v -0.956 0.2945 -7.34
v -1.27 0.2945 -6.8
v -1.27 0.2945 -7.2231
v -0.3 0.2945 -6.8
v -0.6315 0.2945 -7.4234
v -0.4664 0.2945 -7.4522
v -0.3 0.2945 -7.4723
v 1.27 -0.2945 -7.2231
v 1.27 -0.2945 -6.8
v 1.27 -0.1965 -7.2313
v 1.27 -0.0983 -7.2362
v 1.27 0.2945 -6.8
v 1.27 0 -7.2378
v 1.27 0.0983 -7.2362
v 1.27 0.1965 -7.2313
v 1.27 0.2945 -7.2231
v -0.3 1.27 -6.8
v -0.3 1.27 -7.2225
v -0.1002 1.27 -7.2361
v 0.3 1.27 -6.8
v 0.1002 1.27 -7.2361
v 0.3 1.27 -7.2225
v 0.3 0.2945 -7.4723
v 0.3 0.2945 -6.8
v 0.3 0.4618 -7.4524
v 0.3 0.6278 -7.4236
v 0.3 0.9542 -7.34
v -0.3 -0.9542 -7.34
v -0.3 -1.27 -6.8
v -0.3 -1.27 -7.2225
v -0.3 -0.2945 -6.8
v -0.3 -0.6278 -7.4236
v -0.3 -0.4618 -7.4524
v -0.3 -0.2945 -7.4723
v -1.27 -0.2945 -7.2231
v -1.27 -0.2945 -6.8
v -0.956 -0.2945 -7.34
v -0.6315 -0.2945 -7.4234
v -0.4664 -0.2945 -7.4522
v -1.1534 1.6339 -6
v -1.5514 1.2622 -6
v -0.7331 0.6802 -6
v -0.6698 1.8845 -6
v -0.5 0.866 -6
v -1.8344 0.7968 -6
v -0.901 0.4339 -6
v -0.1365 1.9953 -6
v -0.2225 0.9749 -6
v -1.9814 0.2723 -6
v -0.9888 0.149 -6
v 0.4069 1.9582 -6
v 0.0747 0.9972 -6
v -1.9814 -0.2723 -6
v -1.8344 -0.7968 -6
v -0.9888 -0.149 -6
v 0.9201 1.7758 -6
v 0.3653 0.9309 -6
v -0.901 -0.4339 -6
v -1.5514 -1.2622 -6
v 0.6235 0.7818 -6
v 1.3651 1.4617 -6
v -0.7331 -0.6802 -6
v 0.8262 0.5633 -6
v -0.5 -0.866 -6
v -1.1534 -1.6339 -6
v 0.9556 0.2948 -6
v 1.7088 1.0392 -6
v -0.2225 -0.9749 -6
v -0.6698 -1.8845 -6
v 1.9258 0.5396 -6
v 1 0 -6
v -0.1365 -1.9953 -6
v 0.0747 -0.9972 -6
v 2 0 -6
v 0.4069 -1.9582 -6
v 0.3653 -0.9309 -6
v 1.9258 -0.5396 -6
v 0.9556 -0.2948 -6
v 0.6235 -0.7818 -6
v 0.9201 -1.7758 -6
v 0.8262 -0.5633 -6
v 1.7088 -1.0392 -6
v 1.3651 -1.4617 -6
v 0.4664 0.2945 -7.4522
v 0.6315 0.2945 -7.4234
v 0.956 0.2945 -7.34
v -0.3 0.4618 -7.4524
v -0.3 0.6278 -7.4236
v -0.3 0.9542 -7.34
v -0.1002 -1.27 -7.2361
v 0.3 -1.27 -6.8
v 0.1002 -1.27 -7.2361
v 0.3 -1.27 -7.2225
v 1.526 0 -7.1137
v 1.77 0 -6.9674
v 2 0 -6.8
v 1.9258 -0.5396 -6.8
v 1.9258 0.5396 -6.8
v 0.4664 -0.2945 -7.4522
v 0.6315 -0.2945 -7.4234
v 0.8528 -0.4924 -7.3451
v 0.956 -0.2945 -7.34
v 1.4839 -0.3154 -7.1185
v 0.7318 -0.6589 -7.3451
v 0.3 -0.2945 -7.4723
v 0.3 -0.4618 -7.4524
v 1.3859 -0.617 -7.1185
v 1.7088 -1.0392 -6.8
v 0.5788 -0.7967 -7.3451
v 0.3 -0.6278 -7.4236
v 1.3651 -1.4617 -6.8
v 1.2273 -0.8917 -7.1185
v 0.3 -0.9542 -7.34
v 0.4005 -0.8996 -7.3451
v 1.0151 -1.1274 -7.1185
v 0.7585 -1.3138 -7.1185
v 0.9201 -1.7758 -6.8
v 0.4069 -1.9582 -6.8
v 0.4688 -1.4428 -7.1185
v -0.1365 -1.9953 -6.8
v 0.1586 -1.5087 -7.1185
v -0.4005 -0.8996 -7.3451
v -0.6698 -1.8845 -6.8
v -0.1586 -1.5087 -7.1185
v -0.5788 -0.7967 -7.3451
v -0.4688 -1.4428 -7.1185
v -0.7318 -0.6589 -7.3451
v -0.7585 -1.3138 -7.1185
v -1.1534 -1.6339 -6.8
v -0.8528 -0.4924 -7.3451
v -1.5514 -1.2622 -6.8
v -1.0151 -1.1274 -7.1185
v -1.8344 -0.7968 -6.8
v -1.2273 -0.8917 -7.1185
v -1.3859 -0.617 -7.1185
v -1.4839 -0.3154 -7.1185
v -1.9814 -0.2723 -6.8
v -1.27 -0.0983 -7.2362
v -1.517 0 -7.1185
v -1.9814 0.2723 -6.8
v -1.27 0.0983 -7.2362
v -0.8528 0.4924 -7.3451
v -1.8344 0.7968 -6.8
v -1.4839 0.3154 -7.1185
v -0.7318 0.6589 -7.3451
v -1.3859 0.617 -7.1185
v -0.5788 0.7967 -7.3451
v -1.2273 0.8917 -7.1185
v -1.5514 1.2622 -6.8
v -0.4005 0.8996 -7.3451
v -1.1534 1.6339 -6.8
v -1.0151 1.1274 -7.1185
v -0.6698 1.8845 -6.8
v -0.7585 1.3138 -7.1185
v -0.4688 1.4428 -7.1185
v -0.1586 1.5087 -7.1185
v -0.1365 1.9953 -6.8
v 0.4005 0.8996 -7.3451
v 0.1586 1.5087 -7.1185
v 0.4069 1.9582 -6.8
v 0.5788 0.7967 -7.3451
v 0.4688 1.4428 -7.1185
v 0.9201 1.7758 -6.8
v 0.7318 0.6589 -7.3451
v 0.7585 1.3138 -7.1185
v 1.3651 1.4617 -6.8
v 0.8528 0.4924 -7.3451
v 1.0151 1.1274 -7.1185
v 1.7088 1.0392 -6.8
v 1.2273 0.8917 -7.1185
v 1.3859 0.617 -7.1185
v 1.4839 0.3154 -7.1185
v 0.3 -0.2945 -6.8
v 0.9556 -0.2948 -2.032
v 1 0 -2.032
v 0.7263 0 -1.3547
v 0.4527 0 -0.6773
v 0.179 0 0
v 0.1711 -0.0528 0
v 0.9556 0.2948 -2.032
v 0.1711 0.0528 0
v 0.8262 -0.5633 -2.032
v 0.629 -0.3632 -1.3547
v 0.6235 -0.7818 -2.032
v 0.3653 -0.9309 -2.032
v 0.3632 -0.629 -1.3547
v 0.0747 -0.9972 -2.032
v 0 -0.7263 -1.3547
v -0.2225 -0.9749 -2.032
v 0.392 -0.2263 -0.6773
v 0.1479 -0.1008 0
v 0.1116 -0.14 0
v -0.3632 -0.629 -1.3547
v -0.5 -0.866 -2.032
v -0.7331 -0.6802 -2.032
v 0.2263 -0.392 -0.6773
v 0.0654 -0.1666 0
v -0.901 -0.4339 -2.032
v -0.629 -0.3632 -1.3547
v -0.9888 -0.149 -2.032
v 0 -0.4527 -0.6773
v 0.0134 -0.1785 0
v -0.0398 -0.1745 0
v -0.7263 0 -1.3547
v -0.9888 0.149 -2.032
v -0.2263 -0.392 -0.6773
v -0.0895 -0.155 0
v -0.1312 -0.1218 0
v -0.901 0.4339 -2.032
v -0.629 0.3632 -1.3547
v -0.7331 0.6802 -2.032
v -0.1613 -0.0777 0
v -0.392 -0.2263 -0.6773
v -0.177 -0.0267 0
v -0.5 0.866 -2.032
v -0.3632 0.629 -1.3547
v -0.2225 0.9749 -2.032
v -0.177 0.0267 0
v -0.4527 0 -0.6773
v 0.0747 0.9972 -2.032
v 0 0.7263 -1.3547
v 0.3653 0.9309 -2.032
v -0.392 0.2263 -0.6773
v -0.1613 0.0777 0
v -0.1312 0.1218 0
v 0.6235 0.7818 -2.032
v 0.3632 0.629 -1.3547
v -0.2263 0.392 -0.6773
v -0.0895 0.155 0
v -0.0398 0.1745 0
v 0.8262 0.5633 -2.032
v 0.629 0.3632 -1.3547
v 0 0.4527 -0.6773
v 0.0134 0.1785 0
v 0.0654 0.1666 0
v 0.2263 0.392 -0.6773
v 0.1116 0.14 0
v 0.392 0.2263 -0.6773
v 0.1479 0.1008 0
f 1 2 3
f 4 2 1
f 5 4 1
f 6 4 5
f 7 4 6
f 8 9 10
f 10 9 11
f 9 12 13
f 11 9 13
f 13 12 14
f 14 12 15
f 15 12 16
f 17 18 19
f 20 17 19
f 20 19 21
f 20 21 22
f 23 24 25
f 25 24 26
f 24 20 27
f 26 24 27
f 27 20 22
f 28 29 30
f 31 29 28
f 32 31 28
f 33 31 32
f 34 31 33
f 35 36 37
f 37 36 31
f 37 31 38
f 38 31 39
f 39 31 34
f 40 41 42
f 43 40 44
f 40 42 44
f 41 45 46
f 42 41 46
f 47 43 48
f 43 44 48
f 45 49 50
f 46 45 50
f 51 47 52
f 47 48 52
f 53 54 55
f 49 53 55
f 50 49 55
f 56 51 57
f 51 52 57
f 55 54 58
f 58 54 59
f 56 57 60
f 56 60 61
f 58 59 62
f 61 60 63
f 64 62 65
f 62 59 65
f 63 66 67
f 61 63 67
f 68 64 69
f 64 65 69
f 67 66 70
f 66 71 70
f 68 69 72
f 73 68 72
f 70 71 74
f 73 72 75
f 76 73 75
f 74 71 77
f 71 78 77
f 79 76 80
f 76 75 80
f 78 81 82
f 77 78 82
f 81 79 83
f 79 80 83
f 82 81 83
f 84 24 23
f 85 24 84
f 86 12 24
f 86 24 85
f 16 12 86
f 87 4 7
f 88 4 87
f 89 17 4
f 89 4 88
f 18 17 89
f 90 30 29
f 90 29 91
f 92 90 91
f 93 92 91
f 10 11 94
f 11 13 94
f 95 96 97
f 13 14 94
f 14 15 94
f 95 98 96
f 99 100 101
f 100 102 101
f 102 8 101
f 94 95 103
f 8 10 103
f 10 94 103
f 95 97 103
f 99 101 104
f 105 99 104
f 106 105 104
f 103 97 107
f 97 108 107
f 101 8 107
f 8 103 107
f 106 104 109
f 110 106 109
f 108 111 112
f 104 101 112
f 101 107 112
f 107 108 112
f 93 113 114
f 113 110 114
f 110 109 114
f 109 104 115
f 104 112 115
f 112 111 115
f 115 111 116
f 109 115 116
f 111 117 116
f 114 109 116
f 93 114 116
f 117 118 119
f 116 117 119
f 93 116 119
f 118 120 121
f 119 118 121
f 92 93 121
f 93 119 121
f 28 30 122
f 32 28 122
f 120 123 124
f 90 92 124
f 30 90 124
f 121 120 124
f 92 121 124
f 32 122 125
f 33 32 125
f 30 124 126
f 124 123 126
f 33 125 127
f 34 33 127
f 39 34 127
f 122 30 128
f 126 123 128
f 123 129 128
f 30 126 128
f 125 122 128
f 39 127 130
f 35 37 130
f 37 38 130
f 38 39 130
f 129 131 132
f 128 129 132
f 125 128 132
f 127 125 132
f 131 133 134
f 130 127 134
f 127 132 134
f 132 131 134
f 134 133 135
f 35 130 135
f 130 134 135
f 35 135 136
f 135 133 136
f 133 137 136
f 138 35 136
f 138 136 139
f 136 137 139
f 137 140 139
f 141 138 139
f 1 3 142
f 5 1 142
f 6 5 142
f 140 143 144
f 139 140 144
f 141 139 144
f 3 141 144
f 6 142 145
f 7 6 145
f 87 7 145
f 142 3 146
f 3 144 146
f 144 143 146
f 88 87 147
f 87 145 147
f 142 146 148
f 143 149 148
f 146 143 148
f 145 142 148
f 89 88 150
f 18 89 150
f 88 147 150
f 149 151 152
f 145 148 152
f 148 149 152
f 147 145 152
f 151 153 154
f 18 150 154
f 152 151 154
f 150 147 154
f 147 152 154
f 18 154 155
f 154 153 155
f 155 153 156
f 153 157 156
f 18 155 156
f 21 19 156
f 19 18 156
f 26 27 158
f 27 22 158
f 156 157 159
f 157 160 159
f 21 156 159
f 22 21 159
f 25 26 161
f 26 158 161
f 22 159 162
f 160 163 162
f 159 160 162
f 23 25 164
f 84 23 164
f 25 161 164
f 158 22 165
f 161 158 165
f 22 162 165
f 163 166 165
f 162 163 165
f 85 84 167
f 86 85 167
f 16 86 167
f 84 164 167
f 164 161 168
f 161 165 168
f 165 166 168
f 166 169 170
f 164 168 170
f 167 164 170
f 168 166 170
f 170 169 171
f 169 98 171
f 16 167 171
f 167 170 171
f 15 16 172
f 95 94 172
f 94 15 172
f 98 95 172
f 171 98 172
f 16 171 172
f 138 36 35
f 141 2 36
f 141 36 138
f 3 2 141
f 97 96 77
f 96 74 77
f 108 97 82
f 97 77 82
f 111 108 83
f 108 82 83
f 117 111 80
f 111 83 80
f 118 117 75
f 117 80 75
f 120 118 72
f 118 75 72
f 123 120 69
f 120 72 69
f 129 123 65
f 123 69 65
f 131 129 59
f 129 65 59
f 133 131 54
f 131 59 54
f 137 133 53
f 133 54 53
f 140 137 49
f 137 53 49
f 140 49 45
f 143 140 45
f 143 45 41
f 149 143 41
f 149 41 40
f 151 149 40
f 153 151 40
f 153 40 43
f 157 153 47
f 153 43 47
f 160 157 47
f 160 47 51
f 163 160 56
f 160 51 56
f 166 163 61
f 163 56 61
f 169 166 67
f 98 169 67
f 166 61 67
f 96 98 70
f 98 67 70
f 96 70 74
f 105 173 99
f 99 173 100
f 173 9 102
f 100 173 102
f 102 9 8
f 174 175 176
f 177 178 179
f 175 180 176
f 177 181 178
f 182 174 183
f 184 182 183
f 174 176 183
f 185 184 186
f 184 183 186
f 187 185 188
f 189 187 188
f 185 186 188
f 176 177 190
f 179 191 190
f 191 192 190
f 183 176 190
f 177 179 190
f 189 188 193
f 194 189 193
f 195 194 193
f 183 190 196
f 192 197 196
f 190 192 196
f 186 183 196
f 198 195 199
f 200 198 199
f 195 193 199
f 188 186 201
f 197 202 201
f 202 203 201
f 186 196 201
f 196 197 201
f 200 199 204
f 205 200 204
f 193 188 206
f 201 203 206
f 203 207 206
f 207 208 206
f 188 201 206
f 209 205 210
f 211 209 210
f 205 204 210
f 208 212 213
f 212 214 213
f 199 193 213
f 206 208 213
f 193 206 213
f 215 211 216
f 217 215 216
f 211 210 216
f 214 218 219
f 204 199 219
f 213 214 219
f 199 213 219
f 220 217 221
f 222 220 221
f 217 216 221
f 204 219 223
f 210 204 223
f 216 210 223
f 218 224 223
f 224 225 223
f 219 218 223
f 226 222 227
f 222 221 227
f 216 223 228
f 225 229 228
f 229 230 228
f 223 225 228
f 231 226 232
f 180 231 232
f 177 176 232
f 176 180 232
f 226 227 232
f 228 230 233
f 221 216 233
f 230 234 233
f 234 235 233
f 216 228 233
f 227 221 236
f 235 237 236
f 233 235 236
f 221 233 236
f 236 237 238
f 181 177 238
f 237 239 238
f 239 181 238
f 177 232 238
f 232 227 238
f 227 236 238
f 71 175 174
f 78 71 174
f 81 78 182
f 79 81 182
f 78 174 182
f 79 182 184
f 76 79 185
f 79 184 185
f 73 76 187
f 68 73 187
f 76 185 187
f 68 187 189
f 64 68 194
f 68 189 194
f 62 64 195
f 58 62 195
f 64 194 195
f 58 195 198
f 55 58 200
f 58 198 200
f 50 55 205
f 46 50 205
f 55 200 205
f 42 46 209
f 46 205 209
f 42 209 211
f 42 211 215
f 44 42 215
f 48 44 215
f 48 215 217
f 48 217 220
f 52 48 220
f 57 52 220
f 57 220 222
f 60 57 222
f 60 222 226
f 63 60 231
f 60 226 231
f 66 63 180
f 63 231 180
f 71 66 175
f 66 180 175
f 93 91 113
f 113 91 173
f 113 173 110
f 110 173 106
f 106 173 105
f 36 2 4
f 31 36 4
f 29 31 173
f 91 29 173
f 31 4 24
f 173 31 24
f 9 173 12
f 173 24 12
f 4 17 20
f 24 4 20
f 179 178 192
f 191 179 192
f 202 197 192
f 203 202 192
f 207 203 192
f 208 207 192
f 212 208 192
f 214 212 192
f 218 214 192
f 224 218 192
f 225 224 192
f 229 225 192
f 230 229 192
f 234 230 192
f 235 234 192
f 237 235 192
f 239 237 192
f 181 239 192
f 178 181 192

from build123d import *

# Parameters (mm, degrees)
SKETCH2_W      = 0.6
SKETCH2_H      = 1.518456807
EXTRUDE1_DEPTH = 1.27
SKETCH3_W      = 1.103174595
SKETCH3_H      = 0.588939024
EXTRUDE2_DEPTH = 1.27
CHAMFER1_SIZE  = 2.032
CHAMFER1_SIZE2 = 0.820981291


with BuildPart() as part:
    # Sketch1 → Revolve1 (revolve)
    with BuildSketch(Plane(origin=(0, 0, 0), x_dir=(1, 0, 0), z_dir=(0, 1, 0))):
        with BuildLine():
            Line((0, 0), (0, 7.5))
            ThreePointArc((0, 7.5), (1.059481005, 7.319945729), (2, 6.8))
            Line((2, 6.8), (2, 6))
            Line((2, 6), (1, 6))
            Line((1, 6), (1, 0))
            Line((1, 0), (0, 0))
        make_face()
    revolve(axis=Axis((0, 0, 0), (0, 0, -1)))

    # Sketch2 → Extrude1 (cut, symmetric)
    with BuildSketch(Plane(origin=(0, 0, 0), x_dir=(1, 0, 0), z_dir=(0, 1, 0))):
        with Locations((0, 7.559228404)):
            Rectangle(SKETCH2_W, SKETCH2_H)
    extrude(amount=EXTRUDE1_DEPTH, both=True, mode=Mode.SUBTRACT)

    # Sketch3 → Extrude2 (cut, symmetric)
    with BuildSketch(Plane(origin=(0, 0, 0), x_dir=(0, 0, -1), z_dir=(1, 0, 0))):
        with Locations((7.351587298, 0)):
            Rectangle(SKETCH3_W, SKETCH3_H)
    extrude(amount=EXTRUDE2_DEPTH, both=True, mode=Mode.SUBTRACT)

    # Chamfer1
    chamfer1_edges = [part.edges().sort_by_distance(p)[0] for p in [
        (-1, 0, 0),
    ]]
    chamfer1_side = [part.faces().sort_by_distance(p)[0] for p in [
        (-1, 0, -3),
    ]]
    chamfer(chamfer1_edges, length=CHAMFER1_SIZE, length2=CHAMFER1_SIZE2, reference=chamfer1_side[0])


solid = part.part
